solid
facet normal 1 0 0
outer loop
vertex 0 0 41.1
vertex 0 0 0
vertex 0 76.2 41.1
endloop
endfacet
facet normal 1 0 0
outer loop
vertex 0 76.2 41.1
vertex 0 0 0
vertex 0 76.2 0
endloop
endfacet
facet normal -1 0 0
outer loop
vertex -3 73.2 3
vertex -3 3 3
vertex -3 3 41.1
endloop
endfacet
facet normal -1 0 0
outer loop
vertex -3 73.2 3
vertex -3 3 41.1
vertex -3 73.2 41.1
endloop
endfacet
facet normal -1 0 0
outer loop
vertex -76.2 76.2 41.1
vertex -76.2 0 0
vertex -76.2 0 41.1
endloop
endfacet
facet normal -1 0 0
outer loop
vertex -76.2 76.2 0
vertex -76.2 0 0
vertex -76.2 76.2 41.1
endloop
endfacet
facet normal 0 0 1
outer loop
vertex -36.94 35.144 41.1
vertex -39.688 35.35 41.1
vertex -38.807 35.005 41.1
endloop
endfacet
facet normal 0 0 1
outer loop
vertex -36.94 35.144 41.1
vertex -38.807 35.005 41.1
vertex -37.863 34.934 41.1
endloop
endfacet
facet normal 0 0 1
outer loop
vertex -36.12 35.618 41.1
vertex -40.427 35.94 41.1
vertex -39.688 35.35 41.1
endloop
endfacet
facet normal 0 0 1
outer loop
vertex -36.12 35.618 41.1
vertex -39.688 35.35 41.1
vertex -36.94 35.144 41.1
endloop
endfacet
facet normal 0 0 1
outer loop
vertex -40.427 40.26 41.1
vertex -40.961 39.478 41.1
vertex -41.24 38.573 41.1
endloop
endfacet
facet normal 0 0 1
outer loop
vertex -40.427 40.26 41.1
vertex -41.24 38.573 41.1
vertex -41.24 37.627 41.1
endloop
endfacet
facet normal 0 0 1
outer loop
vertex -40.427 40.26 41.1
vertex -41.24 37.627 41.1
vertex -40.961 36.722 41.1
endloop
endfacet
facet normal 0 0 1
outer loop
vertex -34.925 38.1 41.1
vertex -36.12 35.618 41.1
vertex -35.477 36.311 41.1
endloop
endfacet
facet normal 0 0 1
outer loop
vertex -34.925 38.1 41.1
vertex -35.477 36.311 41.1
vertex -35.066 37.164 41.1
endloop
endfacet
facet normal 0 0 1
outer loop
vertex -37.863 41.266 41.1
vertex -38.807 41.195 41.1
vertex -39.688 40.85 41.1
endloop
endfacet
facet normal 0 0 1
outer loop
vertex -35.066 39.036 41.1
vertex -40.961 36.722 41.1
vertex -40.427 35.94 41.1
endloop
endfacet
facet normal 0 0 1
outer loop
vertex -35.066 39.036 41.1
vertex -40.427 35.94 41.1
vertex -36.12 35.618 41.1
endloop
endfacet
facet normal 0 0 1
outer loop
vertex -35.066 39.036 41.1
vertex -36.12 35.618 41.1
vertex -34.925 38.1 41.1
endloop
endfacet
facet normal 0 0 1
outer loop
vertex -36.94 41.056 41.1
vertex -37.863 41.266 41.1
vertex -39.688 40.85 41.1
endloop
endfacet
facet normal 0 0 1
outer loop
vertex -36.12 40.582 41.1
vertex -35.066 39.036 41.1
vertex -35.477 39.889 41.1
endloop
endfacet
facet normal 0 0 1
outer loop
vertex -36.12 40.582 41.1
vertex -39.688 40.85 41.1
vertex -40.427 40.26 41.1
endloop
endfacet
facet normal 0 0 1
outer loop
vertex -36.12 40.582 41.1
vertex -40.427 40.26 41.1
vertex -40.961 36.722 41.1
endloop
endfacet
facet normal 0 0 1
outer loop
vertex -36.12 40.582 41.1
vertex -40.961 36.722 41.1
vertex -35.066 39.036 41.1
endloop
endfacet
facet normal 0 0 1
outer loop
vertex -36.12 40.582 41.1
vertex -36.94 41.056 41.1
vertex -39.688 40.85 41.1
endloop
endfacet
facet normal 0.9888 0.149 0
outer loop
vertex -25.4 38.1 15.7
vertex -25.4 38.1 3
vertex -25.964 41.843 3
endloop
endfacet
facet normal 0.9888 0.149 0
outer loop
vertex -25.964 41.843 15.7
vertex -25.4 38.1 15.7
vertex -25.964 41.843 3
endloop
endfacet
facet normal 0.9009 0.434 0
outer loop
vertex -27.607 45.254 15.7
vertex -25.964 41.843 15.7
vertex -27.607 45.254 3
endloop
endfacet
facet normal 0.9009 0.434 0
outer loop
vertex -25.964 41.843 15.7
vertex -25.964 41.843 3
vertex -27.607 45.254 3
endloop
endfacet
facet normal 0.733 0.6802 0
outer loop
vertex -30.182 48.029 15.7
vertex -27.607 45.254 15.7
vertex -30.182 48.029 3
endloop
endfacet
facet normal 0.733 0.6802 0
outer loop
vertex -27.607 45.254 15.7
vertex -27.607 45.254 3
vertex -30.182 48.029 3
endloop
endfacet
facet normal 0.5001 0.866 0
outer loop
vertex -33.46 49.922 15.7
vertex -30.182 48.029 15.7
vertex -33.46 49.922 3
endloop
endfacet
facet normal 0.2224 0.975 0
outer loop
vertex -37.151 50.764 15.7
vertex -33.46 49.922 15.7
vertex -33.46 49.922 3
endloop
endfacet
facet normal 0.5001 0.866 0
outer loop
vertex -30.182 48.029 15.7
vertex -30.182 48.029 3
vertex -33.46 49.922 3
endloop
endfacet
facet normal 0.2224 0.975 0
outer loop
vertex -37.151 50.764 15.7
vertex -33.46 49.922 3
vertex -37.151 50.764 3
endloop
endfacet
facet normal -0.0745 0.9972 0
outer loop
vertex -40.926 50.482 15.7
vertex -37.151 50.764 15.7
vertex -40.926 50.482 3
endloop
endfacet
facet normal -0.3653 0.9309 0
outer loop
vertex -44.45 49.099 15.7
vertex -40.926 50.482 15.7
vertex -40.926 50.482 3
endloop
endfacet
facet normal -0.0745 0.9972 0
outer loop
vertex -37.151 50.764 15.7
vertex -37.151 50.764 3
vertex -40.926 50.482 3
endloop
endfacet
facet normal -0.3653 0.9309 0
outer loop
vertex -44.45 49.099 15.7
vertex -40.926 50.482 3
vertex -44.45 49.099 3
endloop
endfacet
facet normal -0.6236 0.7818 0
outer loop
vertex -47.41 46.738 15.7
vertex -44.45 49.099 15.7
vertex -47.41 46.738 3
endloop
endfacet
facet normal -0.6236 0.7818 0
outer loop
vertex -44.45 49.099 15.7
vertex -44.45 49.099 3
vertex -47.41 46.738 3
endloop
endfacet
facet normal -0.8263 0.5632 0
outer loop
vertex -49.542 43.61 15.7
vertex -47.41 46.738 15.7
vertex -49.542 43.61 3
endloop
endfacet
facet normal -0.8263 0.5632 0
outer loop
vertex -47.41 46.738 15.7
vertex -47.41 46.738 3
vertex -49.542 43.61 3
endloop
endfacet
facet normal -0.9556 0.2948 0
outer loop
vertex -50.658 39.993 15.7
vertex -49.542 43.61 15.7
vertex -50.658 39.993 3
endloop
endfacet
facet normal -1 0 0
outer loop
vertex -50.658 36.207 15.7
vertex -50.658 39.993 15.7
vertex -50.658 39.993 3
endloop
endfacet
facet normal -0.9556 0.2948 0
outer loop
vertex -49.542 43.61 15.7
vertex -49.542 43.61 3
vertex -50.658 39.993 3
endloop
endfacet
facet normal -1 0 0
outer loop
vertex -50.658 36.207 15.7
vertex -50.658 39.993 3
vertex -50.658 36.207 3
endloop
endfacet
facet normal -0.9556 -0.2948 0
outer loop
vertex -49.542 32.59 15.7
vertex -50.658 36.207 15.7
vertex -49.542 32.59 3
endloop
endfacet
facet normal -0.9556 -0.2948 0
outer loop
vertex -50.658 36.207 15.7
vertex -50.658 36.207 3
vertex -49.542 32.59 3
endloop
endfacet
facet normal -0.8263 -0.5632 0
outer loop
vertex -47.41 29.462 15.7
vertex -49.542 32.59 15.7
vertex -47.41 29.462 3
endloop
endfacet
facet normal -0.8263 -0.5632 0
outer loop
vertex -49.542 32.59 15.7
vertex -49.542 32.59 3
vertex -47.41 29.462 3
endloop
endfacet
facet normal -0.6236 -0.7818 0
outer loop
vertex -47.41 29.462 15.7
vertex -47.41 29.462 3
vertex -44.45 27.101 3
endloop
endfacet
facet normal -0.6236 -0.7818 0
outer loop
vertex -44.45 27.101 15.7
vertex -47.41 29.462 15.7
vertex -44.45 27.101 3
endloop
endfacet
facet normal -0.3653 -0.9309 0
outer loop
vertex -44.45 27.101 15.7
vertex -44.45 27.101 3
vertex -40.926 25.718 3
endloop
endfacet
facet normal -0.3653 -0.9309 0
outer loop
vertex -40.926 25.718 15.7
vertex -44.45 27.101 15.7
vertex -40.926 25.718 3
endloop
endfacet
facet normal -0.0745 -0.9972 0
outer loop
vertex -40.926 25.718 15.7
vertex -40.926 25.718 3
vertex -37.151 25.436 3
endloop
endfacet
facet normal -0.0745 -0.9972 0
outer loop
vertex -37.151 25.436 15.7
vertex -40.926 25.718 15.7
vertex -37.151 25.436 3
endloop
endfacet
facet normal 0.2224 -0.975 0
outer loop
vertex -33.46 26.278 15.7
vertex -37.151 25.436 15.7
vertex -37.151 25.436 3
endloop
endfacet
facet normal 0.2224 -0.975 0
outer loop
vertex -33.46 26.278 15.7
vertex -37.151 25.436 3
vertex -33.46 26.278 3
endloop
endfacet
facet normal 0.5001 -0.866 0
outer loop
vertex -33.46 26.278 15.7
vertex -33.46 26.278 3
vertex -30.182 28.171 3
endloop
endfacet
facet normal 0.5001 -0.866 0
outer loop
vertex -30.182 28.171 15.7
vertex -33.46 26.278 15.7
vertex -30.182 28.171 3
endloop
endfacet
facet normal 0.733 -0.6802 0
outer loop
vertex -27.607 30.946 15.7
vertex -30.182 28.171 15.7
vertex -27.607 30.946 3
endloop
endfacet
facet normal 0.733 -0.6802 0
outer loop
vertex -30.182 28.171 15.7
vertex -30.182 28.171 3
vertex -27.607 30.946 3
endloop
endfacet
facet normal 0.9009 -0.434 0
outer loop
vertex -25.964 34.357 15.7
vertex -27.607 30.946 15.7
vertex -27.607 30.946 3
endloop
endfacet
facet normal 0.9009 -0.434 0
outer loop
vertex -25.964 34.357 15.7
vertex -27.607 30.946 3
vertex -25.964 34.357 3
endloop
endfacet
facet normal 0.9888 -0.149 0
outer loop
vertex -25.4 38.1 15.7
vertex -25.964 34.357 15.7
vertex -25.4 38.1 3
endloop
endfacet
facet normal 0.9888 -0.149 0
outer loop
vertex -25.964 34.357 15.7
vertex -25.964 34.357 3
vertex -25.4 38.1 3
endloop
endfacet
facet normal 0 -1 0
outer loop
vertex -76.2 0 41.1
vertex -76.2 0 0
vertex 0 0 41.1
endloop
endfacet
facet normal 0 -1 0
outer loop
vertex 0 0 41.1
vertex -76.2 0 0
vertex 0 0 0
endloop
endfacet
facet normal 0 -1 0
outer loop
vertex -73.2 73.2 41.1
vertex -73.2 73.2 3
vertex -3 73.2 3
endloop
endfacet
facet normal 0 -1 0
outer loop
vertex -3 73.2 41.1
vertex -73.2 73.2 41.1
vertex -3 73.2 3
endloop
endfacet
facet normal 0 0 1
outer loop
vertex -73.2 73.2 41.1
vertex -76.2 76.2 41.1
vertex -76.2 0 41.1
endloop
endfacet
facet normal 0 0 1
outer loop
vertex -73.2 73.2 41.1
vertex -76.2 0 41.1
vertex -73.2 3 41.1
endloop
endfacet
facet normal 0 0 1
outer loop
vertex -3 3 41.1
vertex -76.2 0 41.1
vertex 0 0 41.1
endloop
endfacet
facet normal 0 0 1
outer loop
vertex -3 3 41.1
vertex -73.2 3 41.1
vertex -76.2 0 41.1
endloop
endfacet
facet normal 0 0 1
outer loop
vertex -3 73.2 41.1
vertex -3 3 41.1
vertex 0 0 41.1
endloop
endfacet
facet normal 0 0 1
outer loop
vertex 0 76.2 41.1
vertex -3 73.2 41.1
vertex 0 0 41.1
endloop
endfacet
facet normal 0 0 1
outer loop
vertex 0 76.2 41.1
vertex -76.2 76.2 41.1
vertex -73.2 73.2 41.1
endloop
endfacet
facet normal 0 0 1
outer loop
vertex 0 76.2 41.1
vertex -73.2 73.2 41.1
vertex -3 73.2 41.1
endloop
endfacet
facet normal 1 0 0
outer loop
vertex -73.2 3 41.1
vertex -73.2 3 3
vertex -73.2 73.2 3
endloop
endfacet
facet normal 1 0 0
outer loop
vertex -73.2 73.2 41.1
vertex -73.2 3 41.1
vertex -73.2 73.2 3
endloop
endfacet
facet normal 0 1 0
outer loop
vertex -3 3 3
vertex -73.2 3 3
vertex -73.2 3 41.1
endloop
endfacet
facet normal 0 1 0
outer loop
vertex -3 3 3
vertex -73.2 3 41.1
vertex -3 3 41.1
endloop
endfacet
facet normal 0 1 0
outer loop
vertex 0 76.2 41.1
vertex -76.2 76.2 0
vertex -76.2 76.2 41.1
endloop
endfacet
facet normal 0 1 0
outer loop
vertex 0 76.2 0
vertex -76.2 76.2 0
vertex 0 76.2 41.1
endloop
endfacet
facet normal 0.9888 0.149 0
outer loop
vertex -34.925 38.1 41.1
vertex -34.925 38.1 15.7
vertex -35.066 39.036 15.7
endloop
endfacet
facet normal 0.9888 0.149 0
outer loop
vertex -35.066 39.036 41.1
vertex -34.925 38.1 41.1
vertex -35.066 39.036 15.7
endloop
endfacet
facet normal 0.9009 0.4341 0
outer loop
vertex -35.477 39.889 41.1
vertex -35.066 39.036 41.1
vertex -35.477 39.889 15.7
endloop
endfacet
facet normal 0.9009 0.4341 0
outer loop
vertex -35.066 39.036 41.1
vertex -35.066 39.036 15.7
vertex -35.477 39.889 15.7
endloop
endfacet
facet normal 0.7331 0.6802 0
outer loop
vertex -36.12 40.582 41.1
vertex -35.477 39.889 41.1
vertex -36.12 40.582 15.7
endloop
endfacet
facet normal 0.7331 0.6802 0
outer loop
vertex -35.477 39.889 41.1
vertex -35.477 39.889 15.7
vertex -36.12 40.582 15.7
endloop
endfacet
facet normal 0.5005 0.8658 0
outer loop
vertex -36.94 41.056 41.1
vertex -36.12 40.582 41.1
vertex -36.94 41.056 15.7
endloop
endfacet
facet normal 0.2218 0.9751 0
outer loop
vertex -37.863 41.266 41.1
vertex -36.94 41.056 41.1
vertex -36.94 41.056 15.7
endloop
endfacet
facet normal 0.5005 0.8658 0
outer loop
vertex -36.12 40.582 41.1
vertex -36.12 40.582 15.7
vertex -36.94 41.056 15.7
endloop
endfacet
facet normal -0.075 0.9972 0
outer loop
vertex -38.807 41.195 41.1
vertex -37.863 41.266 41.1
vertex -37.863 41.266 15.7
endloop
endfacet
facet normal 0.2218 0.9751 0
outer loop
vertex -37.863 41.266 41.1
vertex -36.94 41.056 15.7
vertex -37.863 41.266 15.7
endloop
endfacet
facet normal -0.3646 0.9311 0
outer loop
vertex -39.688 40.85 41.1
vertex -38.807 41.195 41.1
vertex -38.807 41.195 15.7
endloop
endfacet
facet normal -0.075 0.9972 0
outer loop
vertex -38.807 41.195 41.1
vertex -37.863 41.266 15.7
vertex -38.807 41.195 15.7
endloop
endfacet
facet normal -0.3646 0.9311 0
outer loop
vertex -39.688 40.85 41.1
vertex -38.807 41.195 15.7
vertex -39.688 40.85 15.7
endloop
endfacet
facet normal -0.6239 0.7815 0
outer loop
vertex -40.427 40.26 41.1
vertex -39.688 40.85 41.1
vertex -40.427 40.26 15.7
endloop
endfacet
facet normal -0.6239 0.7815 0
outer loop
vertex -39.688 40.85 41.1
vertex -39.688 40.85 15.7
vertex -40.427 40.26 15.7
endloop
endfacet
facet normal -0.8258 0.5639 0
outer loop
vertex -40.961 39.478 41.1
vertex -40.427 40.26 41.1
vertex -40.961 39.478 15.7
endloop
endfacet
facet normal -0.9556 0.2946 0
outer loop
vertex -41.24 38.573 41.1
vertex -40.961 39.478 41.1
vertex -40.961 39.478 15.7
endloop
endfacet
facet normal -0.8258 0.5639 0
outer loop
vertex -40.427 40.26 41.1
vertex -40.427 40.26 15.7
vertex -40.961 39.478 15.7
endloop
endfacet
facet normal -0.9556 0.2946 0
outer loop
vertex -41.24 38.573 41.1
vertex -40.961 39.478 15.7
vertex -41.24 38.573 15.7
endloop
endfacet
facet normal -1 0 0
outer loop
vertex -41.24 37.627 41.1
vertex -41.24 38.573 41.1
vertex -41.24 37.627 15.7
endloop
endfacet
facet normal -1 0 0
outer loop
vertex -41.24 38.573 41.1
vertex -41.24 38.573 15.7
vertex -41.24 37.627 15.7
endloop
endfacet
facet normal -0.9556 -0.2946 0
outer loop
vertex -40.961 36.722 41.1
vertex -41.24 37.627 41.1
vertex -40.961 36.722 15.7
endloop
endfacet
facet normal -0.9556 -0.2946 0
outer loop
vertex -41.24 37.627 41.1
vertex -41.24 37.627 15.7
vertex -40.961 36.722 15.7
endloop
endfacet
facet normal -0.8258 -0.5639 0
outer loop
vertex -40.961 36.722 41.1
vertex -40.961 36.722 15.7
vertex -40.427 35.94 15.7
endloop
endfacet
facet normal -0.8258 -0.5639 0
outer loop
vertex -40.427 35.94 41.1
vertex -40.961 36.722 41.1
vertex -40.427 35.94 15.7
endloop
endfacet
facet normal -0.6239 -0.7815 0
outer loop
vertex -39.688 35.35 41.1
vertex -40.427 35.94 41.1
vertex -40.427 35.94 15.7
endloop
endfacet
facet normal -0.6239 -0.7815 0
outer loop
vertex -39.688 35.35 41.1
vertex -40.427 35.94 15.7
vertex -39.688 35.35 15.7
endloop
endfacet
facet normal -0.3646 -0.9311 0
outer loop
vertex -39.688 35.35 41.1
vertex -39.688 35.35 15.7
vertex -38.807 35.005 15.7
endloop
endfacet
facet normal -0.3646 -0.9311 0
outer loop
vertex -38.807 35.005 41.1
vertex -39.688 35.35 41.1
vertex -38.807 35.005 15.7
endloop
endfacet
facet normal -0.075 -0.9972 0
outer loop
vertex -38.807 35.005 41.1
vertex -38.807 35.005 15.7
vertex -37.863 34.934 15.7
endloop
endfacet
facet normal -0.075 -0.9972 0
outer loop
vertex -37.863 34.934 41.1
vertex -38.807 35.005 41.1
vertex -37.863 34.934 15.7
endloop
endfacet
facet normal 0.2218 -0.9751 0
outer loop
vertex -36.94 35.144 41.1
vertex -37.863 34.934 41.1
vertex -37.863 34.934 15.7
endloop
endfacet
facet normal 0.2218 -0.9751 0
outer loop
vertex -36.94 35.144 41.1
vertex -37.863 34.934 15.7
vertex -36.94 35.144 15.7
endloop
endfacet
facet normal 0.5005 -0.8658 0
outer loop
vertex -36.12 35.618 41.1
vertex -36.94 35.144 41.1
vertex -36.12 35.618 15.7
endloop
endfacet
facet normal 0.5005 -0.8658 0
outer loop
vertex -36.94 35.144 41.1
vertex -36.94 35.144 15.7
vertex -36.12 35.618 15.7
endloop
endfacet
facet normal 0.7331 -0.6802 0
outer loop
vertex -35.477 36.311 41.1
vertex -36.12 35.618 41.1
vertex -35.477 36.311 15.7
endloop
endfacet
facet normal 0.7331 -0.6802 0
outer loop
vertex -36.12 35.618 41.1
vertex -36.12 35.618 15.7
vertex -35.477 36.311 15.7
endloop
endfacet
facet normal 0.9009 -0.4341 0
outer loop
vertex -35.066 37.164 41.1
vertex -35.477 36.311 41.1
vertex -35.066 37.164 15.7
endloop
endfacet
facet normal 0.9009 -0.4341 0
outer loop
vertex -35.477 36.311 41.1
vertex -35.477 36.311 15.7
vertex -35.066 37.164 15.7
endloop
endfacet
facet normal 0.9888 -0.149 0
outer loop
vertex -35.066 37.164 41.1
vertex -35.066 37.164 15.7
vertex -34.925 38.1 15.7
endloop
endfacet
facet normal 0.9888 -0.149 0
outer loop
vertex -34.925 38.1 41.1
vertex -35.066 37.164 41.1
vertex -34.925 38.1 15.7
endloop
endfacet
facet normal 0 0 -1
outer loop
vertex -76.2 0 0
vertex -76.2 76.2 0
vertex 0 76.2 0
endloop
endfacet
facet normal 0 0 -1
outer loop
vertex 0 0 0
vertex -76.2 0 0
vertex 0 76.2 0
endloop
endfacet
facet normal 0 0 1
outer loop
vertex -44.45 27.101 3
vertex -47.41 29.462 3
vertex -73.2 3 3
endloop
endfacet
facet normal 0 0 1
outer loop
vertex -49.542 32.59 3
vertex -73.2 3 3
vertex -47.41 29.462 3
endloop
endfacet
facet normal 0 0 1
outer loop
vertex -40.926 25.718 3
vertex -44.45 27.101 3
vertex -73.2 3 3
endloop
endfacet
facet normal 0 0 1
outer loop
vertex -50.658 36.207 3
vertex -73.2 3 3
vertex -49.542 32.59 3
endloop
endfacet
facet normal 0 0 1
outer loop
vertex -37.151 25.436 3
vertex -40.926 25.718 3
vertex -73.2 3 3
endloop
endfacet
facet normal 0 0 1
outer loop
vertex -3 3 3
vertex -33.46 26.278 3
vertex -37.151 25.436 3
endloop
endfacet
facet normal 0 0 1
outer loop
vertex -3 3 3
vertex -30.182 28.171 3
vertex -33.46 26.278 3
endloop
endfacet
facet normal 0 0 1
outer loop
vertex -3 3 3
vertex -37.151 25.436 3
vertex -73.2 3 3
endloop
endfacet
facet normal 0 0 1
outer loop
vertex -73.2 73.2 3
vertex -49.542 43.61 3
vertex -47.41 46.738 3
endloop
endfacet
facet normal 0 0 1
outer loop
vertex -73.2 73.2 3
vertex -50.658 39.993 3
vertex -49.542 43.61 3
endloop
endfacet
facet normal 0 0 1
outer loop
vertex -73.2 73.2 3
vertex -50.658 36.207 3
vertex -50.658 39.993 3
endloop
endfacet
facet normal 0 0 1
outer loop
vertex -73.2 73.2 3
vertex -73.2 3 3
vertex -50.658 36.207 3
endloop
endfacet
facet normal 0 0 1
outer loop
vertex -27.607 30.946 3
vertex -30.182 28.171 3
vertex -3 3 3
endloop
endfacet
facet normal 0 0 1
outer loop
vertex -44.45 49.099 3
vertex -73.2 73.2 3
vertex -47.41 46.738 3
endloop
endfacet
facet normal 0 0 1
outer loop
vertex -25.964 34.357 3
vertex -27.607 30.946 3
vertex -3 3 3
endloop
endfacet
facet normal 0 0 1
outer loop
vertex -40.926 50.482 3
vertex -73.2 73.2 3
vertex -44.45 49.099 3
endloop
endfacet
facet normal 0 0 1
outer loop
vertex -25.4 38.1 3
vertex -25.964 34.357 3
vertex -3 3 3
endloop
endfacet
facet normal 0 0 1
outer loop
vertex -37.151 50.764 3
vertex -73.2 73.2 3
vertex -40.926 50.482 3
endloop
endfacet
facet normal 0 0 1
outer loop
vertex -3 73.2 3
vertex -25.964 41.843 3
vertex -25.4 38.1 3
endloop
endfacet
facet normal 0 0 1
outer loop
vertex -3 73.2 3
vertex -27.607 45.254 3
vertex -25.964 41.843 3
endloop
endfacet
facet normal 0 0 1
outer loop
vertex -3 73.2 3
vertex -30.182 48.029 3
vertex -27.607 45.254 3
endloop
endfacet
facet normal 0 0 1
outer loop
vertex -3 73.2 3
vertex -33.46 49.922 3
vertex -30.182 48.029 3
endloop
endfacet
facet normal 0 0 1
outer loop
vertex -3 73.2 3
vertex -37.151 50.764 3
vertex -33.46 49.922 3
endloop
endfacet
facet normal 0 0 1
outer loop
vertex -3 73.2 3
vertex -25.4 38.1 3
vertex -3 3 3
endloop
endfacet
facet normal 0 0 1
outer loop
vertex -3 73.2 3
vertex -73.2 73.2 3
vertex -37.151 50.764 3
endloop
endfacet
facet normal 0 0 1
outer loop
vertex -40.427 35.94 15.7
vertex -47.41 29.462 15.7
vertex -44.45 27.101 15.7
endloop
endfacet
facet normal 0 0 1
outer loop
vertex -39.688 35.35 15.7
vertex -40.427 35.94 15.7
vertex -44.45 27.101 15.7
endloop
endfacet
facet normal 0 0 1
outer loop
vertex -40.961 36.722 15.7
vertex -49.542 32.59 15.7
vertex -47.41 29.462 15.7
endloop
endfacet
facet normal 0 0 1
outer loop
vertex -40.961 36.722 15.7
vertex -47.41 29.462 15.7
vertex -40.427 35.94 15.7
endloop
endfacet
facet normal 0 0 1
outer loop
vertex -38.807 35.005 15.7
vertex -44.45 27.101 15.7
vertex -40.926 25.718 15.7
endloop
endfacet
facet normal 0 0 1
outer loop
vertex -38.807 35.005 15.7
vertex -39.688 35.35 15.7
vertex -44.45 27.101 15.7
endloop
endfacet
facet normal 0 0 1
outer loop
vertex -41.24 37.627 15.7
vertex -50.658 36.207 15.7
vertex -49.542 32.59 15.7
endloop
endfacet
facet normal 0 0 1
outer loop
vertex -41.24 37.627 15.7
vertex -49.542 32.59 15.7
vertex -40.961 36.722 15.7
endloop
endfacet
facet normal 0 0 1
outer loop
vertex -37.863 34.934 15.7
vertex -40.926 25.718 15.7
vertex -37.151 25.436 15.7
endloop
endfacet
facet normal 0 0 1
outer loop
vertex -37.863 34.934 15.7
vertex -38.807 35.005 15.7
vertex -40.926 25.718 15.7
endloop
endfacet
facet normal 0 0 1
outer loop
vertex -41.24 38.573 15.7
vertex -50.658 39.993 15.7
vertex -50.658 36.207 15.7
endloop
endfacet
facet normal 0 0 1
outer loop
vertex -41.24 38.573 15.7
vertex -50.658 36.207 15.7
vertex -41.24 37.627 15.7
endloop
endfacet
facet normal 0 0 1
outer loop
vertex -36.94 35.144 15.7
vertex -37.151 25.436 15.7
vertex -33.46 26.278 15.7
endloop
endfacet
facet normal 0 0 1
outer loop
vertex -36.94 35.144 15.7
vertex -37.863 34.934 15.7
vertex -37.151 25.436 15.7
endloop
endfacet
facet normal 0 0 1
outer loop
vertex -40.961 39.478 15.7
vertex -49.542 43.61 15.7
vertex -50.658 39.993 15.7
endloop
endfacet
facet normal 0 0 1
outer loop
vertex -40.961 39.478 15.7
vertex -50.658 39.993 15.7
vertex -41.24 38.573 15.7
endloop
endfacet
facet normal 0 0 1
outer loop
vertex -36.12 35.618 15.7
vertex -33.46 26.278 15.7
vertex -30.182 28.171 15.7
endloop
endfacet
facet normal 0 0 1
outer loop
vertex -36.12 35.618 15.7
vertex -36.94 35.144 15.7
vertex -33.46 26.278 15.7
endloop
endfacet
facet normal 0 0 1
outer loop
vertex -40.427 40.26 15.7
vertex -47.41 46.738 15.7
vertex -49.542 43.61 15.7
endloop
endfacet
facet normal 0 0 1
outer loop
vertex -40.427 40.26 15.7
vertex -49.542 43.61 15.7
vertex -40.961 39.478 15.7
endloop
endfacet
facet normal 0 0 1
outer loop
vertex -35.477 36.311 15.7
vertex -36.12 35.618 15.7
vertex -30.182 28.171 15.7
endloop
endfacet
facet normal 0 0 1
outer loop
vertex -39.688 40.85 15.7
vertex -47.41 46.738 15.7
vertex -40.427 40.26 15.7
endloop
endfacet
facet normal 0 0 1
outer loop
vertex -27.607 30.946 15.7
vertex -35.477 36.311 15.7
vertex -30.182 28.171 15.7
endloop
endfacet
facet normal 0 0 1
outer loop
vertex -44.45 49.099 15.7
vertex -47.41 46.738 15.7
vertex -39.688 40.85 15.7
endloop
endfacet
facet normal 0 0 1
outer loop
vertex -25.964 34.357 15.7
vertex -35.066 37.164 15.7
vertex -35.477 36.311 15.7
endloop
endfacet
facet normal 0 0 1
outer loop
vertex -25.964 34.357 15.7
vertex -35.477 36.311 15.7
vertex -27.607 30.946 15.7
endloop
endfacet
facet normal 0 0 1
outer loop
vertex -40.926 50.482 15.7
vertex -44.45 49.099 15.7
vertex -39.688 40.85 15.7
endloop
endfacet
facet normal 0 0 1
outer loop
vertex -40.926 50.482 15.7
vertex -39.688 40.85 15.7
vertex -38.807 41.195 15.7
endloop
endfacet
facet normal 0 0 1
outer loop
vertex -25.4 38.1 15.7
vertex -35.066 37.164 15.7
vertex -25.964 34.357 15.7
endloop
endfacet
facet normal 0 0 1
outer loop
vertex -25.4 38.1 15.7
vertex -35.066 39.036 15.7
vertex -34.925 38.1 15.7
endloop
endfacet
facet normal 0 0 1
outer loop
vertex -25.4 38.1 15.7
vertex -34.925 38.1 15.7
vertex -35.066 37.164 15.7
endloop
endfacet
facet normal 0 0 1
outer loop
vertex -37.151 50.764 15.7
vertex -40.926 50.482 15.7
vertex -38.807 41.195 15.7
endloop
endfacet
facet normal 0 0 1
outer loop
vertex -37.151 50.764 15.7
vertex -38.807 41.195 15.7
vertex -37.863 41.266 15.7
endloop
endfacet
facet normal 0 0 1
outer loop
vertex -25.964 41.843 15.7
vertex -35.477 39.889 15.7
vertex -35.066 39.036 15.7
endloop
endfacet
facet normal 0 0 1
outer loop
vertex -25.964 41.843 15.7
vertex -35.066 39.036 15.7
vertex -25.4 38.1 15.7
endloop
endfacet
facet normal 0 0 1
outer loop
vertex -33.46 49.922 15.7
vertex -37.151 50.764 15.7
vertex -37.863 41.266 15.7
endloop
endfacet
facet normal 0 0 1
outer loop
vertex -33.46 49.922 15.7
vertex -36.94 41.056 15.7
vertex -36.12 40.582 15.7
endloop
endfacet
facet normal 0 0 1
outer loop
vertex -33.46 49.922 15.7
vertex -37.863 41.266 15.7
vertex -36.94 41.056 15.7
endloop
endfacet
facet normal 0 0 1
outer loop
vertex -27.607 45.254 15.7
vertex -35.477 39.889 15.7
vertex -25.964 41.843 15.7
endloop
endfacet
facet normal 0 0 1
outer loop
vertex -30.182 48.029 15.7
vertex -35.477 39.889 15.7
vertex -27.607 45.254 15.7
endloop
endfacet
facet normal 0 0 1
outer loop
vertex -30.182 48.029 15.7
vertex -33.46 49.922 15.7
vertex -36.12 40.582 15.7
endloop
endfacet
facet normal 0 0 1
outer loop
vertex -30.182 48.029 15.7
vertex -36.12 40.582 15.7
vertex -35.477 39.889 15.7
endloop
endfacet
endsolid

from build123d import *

# Parameters (mm, degrees)
F0_W     = 76.2
F0_H     = 76.2
F1_DEPTH = 3
F2_W     = 76.2
F2_H     = 76.2
F2_W_2   = 70.2
F2_H_2   = 70.2
F3_DEPTH = 38.1
F4_R     = 12.7
F5_DEPTH = 12.7
F6_R     = 3.175
F7_DEPTH = 25.4


with BuildPart() as f1:
    # F0 (on Top) → F1 (new body)
    with BuildSketch(Plane.XY):
        with Locations((-38.1, 38.1)):
            Rectangle(F0_W, F0_H)
    extrude(amount=F1_DEPTH)

    # F2 (on face) → F3 (join)
    with BuildSketch(Plane.XY.offset(3)):
        with Locations((-38.1, 38.1)):
            Rectangle(F2_W, F2_H)
        with Locations((-38.1, 38.1)):
            Rectangle(F2_W_2, F2_H_2, mode=Mode.SUBTRACT)
    extrude(amount=F3_DEPTH)

    # F4 (on face) → F5 (join)
    with BuildSketch(Plane.XY.offset(3)):
        with Locations((-38.1, 38.1)):
            Circle(F4_R)
    extrude(amount=F5_DEPTH)

    # F6 (on face) → F7 (join)
    with BuildSketch(Plane.XY.offset(15.7)):
        with Locations((-38.1, 38.1)):
            Circle(F6_R)
    extrude(amount=F7_DEPTH)


solid = f1.part
